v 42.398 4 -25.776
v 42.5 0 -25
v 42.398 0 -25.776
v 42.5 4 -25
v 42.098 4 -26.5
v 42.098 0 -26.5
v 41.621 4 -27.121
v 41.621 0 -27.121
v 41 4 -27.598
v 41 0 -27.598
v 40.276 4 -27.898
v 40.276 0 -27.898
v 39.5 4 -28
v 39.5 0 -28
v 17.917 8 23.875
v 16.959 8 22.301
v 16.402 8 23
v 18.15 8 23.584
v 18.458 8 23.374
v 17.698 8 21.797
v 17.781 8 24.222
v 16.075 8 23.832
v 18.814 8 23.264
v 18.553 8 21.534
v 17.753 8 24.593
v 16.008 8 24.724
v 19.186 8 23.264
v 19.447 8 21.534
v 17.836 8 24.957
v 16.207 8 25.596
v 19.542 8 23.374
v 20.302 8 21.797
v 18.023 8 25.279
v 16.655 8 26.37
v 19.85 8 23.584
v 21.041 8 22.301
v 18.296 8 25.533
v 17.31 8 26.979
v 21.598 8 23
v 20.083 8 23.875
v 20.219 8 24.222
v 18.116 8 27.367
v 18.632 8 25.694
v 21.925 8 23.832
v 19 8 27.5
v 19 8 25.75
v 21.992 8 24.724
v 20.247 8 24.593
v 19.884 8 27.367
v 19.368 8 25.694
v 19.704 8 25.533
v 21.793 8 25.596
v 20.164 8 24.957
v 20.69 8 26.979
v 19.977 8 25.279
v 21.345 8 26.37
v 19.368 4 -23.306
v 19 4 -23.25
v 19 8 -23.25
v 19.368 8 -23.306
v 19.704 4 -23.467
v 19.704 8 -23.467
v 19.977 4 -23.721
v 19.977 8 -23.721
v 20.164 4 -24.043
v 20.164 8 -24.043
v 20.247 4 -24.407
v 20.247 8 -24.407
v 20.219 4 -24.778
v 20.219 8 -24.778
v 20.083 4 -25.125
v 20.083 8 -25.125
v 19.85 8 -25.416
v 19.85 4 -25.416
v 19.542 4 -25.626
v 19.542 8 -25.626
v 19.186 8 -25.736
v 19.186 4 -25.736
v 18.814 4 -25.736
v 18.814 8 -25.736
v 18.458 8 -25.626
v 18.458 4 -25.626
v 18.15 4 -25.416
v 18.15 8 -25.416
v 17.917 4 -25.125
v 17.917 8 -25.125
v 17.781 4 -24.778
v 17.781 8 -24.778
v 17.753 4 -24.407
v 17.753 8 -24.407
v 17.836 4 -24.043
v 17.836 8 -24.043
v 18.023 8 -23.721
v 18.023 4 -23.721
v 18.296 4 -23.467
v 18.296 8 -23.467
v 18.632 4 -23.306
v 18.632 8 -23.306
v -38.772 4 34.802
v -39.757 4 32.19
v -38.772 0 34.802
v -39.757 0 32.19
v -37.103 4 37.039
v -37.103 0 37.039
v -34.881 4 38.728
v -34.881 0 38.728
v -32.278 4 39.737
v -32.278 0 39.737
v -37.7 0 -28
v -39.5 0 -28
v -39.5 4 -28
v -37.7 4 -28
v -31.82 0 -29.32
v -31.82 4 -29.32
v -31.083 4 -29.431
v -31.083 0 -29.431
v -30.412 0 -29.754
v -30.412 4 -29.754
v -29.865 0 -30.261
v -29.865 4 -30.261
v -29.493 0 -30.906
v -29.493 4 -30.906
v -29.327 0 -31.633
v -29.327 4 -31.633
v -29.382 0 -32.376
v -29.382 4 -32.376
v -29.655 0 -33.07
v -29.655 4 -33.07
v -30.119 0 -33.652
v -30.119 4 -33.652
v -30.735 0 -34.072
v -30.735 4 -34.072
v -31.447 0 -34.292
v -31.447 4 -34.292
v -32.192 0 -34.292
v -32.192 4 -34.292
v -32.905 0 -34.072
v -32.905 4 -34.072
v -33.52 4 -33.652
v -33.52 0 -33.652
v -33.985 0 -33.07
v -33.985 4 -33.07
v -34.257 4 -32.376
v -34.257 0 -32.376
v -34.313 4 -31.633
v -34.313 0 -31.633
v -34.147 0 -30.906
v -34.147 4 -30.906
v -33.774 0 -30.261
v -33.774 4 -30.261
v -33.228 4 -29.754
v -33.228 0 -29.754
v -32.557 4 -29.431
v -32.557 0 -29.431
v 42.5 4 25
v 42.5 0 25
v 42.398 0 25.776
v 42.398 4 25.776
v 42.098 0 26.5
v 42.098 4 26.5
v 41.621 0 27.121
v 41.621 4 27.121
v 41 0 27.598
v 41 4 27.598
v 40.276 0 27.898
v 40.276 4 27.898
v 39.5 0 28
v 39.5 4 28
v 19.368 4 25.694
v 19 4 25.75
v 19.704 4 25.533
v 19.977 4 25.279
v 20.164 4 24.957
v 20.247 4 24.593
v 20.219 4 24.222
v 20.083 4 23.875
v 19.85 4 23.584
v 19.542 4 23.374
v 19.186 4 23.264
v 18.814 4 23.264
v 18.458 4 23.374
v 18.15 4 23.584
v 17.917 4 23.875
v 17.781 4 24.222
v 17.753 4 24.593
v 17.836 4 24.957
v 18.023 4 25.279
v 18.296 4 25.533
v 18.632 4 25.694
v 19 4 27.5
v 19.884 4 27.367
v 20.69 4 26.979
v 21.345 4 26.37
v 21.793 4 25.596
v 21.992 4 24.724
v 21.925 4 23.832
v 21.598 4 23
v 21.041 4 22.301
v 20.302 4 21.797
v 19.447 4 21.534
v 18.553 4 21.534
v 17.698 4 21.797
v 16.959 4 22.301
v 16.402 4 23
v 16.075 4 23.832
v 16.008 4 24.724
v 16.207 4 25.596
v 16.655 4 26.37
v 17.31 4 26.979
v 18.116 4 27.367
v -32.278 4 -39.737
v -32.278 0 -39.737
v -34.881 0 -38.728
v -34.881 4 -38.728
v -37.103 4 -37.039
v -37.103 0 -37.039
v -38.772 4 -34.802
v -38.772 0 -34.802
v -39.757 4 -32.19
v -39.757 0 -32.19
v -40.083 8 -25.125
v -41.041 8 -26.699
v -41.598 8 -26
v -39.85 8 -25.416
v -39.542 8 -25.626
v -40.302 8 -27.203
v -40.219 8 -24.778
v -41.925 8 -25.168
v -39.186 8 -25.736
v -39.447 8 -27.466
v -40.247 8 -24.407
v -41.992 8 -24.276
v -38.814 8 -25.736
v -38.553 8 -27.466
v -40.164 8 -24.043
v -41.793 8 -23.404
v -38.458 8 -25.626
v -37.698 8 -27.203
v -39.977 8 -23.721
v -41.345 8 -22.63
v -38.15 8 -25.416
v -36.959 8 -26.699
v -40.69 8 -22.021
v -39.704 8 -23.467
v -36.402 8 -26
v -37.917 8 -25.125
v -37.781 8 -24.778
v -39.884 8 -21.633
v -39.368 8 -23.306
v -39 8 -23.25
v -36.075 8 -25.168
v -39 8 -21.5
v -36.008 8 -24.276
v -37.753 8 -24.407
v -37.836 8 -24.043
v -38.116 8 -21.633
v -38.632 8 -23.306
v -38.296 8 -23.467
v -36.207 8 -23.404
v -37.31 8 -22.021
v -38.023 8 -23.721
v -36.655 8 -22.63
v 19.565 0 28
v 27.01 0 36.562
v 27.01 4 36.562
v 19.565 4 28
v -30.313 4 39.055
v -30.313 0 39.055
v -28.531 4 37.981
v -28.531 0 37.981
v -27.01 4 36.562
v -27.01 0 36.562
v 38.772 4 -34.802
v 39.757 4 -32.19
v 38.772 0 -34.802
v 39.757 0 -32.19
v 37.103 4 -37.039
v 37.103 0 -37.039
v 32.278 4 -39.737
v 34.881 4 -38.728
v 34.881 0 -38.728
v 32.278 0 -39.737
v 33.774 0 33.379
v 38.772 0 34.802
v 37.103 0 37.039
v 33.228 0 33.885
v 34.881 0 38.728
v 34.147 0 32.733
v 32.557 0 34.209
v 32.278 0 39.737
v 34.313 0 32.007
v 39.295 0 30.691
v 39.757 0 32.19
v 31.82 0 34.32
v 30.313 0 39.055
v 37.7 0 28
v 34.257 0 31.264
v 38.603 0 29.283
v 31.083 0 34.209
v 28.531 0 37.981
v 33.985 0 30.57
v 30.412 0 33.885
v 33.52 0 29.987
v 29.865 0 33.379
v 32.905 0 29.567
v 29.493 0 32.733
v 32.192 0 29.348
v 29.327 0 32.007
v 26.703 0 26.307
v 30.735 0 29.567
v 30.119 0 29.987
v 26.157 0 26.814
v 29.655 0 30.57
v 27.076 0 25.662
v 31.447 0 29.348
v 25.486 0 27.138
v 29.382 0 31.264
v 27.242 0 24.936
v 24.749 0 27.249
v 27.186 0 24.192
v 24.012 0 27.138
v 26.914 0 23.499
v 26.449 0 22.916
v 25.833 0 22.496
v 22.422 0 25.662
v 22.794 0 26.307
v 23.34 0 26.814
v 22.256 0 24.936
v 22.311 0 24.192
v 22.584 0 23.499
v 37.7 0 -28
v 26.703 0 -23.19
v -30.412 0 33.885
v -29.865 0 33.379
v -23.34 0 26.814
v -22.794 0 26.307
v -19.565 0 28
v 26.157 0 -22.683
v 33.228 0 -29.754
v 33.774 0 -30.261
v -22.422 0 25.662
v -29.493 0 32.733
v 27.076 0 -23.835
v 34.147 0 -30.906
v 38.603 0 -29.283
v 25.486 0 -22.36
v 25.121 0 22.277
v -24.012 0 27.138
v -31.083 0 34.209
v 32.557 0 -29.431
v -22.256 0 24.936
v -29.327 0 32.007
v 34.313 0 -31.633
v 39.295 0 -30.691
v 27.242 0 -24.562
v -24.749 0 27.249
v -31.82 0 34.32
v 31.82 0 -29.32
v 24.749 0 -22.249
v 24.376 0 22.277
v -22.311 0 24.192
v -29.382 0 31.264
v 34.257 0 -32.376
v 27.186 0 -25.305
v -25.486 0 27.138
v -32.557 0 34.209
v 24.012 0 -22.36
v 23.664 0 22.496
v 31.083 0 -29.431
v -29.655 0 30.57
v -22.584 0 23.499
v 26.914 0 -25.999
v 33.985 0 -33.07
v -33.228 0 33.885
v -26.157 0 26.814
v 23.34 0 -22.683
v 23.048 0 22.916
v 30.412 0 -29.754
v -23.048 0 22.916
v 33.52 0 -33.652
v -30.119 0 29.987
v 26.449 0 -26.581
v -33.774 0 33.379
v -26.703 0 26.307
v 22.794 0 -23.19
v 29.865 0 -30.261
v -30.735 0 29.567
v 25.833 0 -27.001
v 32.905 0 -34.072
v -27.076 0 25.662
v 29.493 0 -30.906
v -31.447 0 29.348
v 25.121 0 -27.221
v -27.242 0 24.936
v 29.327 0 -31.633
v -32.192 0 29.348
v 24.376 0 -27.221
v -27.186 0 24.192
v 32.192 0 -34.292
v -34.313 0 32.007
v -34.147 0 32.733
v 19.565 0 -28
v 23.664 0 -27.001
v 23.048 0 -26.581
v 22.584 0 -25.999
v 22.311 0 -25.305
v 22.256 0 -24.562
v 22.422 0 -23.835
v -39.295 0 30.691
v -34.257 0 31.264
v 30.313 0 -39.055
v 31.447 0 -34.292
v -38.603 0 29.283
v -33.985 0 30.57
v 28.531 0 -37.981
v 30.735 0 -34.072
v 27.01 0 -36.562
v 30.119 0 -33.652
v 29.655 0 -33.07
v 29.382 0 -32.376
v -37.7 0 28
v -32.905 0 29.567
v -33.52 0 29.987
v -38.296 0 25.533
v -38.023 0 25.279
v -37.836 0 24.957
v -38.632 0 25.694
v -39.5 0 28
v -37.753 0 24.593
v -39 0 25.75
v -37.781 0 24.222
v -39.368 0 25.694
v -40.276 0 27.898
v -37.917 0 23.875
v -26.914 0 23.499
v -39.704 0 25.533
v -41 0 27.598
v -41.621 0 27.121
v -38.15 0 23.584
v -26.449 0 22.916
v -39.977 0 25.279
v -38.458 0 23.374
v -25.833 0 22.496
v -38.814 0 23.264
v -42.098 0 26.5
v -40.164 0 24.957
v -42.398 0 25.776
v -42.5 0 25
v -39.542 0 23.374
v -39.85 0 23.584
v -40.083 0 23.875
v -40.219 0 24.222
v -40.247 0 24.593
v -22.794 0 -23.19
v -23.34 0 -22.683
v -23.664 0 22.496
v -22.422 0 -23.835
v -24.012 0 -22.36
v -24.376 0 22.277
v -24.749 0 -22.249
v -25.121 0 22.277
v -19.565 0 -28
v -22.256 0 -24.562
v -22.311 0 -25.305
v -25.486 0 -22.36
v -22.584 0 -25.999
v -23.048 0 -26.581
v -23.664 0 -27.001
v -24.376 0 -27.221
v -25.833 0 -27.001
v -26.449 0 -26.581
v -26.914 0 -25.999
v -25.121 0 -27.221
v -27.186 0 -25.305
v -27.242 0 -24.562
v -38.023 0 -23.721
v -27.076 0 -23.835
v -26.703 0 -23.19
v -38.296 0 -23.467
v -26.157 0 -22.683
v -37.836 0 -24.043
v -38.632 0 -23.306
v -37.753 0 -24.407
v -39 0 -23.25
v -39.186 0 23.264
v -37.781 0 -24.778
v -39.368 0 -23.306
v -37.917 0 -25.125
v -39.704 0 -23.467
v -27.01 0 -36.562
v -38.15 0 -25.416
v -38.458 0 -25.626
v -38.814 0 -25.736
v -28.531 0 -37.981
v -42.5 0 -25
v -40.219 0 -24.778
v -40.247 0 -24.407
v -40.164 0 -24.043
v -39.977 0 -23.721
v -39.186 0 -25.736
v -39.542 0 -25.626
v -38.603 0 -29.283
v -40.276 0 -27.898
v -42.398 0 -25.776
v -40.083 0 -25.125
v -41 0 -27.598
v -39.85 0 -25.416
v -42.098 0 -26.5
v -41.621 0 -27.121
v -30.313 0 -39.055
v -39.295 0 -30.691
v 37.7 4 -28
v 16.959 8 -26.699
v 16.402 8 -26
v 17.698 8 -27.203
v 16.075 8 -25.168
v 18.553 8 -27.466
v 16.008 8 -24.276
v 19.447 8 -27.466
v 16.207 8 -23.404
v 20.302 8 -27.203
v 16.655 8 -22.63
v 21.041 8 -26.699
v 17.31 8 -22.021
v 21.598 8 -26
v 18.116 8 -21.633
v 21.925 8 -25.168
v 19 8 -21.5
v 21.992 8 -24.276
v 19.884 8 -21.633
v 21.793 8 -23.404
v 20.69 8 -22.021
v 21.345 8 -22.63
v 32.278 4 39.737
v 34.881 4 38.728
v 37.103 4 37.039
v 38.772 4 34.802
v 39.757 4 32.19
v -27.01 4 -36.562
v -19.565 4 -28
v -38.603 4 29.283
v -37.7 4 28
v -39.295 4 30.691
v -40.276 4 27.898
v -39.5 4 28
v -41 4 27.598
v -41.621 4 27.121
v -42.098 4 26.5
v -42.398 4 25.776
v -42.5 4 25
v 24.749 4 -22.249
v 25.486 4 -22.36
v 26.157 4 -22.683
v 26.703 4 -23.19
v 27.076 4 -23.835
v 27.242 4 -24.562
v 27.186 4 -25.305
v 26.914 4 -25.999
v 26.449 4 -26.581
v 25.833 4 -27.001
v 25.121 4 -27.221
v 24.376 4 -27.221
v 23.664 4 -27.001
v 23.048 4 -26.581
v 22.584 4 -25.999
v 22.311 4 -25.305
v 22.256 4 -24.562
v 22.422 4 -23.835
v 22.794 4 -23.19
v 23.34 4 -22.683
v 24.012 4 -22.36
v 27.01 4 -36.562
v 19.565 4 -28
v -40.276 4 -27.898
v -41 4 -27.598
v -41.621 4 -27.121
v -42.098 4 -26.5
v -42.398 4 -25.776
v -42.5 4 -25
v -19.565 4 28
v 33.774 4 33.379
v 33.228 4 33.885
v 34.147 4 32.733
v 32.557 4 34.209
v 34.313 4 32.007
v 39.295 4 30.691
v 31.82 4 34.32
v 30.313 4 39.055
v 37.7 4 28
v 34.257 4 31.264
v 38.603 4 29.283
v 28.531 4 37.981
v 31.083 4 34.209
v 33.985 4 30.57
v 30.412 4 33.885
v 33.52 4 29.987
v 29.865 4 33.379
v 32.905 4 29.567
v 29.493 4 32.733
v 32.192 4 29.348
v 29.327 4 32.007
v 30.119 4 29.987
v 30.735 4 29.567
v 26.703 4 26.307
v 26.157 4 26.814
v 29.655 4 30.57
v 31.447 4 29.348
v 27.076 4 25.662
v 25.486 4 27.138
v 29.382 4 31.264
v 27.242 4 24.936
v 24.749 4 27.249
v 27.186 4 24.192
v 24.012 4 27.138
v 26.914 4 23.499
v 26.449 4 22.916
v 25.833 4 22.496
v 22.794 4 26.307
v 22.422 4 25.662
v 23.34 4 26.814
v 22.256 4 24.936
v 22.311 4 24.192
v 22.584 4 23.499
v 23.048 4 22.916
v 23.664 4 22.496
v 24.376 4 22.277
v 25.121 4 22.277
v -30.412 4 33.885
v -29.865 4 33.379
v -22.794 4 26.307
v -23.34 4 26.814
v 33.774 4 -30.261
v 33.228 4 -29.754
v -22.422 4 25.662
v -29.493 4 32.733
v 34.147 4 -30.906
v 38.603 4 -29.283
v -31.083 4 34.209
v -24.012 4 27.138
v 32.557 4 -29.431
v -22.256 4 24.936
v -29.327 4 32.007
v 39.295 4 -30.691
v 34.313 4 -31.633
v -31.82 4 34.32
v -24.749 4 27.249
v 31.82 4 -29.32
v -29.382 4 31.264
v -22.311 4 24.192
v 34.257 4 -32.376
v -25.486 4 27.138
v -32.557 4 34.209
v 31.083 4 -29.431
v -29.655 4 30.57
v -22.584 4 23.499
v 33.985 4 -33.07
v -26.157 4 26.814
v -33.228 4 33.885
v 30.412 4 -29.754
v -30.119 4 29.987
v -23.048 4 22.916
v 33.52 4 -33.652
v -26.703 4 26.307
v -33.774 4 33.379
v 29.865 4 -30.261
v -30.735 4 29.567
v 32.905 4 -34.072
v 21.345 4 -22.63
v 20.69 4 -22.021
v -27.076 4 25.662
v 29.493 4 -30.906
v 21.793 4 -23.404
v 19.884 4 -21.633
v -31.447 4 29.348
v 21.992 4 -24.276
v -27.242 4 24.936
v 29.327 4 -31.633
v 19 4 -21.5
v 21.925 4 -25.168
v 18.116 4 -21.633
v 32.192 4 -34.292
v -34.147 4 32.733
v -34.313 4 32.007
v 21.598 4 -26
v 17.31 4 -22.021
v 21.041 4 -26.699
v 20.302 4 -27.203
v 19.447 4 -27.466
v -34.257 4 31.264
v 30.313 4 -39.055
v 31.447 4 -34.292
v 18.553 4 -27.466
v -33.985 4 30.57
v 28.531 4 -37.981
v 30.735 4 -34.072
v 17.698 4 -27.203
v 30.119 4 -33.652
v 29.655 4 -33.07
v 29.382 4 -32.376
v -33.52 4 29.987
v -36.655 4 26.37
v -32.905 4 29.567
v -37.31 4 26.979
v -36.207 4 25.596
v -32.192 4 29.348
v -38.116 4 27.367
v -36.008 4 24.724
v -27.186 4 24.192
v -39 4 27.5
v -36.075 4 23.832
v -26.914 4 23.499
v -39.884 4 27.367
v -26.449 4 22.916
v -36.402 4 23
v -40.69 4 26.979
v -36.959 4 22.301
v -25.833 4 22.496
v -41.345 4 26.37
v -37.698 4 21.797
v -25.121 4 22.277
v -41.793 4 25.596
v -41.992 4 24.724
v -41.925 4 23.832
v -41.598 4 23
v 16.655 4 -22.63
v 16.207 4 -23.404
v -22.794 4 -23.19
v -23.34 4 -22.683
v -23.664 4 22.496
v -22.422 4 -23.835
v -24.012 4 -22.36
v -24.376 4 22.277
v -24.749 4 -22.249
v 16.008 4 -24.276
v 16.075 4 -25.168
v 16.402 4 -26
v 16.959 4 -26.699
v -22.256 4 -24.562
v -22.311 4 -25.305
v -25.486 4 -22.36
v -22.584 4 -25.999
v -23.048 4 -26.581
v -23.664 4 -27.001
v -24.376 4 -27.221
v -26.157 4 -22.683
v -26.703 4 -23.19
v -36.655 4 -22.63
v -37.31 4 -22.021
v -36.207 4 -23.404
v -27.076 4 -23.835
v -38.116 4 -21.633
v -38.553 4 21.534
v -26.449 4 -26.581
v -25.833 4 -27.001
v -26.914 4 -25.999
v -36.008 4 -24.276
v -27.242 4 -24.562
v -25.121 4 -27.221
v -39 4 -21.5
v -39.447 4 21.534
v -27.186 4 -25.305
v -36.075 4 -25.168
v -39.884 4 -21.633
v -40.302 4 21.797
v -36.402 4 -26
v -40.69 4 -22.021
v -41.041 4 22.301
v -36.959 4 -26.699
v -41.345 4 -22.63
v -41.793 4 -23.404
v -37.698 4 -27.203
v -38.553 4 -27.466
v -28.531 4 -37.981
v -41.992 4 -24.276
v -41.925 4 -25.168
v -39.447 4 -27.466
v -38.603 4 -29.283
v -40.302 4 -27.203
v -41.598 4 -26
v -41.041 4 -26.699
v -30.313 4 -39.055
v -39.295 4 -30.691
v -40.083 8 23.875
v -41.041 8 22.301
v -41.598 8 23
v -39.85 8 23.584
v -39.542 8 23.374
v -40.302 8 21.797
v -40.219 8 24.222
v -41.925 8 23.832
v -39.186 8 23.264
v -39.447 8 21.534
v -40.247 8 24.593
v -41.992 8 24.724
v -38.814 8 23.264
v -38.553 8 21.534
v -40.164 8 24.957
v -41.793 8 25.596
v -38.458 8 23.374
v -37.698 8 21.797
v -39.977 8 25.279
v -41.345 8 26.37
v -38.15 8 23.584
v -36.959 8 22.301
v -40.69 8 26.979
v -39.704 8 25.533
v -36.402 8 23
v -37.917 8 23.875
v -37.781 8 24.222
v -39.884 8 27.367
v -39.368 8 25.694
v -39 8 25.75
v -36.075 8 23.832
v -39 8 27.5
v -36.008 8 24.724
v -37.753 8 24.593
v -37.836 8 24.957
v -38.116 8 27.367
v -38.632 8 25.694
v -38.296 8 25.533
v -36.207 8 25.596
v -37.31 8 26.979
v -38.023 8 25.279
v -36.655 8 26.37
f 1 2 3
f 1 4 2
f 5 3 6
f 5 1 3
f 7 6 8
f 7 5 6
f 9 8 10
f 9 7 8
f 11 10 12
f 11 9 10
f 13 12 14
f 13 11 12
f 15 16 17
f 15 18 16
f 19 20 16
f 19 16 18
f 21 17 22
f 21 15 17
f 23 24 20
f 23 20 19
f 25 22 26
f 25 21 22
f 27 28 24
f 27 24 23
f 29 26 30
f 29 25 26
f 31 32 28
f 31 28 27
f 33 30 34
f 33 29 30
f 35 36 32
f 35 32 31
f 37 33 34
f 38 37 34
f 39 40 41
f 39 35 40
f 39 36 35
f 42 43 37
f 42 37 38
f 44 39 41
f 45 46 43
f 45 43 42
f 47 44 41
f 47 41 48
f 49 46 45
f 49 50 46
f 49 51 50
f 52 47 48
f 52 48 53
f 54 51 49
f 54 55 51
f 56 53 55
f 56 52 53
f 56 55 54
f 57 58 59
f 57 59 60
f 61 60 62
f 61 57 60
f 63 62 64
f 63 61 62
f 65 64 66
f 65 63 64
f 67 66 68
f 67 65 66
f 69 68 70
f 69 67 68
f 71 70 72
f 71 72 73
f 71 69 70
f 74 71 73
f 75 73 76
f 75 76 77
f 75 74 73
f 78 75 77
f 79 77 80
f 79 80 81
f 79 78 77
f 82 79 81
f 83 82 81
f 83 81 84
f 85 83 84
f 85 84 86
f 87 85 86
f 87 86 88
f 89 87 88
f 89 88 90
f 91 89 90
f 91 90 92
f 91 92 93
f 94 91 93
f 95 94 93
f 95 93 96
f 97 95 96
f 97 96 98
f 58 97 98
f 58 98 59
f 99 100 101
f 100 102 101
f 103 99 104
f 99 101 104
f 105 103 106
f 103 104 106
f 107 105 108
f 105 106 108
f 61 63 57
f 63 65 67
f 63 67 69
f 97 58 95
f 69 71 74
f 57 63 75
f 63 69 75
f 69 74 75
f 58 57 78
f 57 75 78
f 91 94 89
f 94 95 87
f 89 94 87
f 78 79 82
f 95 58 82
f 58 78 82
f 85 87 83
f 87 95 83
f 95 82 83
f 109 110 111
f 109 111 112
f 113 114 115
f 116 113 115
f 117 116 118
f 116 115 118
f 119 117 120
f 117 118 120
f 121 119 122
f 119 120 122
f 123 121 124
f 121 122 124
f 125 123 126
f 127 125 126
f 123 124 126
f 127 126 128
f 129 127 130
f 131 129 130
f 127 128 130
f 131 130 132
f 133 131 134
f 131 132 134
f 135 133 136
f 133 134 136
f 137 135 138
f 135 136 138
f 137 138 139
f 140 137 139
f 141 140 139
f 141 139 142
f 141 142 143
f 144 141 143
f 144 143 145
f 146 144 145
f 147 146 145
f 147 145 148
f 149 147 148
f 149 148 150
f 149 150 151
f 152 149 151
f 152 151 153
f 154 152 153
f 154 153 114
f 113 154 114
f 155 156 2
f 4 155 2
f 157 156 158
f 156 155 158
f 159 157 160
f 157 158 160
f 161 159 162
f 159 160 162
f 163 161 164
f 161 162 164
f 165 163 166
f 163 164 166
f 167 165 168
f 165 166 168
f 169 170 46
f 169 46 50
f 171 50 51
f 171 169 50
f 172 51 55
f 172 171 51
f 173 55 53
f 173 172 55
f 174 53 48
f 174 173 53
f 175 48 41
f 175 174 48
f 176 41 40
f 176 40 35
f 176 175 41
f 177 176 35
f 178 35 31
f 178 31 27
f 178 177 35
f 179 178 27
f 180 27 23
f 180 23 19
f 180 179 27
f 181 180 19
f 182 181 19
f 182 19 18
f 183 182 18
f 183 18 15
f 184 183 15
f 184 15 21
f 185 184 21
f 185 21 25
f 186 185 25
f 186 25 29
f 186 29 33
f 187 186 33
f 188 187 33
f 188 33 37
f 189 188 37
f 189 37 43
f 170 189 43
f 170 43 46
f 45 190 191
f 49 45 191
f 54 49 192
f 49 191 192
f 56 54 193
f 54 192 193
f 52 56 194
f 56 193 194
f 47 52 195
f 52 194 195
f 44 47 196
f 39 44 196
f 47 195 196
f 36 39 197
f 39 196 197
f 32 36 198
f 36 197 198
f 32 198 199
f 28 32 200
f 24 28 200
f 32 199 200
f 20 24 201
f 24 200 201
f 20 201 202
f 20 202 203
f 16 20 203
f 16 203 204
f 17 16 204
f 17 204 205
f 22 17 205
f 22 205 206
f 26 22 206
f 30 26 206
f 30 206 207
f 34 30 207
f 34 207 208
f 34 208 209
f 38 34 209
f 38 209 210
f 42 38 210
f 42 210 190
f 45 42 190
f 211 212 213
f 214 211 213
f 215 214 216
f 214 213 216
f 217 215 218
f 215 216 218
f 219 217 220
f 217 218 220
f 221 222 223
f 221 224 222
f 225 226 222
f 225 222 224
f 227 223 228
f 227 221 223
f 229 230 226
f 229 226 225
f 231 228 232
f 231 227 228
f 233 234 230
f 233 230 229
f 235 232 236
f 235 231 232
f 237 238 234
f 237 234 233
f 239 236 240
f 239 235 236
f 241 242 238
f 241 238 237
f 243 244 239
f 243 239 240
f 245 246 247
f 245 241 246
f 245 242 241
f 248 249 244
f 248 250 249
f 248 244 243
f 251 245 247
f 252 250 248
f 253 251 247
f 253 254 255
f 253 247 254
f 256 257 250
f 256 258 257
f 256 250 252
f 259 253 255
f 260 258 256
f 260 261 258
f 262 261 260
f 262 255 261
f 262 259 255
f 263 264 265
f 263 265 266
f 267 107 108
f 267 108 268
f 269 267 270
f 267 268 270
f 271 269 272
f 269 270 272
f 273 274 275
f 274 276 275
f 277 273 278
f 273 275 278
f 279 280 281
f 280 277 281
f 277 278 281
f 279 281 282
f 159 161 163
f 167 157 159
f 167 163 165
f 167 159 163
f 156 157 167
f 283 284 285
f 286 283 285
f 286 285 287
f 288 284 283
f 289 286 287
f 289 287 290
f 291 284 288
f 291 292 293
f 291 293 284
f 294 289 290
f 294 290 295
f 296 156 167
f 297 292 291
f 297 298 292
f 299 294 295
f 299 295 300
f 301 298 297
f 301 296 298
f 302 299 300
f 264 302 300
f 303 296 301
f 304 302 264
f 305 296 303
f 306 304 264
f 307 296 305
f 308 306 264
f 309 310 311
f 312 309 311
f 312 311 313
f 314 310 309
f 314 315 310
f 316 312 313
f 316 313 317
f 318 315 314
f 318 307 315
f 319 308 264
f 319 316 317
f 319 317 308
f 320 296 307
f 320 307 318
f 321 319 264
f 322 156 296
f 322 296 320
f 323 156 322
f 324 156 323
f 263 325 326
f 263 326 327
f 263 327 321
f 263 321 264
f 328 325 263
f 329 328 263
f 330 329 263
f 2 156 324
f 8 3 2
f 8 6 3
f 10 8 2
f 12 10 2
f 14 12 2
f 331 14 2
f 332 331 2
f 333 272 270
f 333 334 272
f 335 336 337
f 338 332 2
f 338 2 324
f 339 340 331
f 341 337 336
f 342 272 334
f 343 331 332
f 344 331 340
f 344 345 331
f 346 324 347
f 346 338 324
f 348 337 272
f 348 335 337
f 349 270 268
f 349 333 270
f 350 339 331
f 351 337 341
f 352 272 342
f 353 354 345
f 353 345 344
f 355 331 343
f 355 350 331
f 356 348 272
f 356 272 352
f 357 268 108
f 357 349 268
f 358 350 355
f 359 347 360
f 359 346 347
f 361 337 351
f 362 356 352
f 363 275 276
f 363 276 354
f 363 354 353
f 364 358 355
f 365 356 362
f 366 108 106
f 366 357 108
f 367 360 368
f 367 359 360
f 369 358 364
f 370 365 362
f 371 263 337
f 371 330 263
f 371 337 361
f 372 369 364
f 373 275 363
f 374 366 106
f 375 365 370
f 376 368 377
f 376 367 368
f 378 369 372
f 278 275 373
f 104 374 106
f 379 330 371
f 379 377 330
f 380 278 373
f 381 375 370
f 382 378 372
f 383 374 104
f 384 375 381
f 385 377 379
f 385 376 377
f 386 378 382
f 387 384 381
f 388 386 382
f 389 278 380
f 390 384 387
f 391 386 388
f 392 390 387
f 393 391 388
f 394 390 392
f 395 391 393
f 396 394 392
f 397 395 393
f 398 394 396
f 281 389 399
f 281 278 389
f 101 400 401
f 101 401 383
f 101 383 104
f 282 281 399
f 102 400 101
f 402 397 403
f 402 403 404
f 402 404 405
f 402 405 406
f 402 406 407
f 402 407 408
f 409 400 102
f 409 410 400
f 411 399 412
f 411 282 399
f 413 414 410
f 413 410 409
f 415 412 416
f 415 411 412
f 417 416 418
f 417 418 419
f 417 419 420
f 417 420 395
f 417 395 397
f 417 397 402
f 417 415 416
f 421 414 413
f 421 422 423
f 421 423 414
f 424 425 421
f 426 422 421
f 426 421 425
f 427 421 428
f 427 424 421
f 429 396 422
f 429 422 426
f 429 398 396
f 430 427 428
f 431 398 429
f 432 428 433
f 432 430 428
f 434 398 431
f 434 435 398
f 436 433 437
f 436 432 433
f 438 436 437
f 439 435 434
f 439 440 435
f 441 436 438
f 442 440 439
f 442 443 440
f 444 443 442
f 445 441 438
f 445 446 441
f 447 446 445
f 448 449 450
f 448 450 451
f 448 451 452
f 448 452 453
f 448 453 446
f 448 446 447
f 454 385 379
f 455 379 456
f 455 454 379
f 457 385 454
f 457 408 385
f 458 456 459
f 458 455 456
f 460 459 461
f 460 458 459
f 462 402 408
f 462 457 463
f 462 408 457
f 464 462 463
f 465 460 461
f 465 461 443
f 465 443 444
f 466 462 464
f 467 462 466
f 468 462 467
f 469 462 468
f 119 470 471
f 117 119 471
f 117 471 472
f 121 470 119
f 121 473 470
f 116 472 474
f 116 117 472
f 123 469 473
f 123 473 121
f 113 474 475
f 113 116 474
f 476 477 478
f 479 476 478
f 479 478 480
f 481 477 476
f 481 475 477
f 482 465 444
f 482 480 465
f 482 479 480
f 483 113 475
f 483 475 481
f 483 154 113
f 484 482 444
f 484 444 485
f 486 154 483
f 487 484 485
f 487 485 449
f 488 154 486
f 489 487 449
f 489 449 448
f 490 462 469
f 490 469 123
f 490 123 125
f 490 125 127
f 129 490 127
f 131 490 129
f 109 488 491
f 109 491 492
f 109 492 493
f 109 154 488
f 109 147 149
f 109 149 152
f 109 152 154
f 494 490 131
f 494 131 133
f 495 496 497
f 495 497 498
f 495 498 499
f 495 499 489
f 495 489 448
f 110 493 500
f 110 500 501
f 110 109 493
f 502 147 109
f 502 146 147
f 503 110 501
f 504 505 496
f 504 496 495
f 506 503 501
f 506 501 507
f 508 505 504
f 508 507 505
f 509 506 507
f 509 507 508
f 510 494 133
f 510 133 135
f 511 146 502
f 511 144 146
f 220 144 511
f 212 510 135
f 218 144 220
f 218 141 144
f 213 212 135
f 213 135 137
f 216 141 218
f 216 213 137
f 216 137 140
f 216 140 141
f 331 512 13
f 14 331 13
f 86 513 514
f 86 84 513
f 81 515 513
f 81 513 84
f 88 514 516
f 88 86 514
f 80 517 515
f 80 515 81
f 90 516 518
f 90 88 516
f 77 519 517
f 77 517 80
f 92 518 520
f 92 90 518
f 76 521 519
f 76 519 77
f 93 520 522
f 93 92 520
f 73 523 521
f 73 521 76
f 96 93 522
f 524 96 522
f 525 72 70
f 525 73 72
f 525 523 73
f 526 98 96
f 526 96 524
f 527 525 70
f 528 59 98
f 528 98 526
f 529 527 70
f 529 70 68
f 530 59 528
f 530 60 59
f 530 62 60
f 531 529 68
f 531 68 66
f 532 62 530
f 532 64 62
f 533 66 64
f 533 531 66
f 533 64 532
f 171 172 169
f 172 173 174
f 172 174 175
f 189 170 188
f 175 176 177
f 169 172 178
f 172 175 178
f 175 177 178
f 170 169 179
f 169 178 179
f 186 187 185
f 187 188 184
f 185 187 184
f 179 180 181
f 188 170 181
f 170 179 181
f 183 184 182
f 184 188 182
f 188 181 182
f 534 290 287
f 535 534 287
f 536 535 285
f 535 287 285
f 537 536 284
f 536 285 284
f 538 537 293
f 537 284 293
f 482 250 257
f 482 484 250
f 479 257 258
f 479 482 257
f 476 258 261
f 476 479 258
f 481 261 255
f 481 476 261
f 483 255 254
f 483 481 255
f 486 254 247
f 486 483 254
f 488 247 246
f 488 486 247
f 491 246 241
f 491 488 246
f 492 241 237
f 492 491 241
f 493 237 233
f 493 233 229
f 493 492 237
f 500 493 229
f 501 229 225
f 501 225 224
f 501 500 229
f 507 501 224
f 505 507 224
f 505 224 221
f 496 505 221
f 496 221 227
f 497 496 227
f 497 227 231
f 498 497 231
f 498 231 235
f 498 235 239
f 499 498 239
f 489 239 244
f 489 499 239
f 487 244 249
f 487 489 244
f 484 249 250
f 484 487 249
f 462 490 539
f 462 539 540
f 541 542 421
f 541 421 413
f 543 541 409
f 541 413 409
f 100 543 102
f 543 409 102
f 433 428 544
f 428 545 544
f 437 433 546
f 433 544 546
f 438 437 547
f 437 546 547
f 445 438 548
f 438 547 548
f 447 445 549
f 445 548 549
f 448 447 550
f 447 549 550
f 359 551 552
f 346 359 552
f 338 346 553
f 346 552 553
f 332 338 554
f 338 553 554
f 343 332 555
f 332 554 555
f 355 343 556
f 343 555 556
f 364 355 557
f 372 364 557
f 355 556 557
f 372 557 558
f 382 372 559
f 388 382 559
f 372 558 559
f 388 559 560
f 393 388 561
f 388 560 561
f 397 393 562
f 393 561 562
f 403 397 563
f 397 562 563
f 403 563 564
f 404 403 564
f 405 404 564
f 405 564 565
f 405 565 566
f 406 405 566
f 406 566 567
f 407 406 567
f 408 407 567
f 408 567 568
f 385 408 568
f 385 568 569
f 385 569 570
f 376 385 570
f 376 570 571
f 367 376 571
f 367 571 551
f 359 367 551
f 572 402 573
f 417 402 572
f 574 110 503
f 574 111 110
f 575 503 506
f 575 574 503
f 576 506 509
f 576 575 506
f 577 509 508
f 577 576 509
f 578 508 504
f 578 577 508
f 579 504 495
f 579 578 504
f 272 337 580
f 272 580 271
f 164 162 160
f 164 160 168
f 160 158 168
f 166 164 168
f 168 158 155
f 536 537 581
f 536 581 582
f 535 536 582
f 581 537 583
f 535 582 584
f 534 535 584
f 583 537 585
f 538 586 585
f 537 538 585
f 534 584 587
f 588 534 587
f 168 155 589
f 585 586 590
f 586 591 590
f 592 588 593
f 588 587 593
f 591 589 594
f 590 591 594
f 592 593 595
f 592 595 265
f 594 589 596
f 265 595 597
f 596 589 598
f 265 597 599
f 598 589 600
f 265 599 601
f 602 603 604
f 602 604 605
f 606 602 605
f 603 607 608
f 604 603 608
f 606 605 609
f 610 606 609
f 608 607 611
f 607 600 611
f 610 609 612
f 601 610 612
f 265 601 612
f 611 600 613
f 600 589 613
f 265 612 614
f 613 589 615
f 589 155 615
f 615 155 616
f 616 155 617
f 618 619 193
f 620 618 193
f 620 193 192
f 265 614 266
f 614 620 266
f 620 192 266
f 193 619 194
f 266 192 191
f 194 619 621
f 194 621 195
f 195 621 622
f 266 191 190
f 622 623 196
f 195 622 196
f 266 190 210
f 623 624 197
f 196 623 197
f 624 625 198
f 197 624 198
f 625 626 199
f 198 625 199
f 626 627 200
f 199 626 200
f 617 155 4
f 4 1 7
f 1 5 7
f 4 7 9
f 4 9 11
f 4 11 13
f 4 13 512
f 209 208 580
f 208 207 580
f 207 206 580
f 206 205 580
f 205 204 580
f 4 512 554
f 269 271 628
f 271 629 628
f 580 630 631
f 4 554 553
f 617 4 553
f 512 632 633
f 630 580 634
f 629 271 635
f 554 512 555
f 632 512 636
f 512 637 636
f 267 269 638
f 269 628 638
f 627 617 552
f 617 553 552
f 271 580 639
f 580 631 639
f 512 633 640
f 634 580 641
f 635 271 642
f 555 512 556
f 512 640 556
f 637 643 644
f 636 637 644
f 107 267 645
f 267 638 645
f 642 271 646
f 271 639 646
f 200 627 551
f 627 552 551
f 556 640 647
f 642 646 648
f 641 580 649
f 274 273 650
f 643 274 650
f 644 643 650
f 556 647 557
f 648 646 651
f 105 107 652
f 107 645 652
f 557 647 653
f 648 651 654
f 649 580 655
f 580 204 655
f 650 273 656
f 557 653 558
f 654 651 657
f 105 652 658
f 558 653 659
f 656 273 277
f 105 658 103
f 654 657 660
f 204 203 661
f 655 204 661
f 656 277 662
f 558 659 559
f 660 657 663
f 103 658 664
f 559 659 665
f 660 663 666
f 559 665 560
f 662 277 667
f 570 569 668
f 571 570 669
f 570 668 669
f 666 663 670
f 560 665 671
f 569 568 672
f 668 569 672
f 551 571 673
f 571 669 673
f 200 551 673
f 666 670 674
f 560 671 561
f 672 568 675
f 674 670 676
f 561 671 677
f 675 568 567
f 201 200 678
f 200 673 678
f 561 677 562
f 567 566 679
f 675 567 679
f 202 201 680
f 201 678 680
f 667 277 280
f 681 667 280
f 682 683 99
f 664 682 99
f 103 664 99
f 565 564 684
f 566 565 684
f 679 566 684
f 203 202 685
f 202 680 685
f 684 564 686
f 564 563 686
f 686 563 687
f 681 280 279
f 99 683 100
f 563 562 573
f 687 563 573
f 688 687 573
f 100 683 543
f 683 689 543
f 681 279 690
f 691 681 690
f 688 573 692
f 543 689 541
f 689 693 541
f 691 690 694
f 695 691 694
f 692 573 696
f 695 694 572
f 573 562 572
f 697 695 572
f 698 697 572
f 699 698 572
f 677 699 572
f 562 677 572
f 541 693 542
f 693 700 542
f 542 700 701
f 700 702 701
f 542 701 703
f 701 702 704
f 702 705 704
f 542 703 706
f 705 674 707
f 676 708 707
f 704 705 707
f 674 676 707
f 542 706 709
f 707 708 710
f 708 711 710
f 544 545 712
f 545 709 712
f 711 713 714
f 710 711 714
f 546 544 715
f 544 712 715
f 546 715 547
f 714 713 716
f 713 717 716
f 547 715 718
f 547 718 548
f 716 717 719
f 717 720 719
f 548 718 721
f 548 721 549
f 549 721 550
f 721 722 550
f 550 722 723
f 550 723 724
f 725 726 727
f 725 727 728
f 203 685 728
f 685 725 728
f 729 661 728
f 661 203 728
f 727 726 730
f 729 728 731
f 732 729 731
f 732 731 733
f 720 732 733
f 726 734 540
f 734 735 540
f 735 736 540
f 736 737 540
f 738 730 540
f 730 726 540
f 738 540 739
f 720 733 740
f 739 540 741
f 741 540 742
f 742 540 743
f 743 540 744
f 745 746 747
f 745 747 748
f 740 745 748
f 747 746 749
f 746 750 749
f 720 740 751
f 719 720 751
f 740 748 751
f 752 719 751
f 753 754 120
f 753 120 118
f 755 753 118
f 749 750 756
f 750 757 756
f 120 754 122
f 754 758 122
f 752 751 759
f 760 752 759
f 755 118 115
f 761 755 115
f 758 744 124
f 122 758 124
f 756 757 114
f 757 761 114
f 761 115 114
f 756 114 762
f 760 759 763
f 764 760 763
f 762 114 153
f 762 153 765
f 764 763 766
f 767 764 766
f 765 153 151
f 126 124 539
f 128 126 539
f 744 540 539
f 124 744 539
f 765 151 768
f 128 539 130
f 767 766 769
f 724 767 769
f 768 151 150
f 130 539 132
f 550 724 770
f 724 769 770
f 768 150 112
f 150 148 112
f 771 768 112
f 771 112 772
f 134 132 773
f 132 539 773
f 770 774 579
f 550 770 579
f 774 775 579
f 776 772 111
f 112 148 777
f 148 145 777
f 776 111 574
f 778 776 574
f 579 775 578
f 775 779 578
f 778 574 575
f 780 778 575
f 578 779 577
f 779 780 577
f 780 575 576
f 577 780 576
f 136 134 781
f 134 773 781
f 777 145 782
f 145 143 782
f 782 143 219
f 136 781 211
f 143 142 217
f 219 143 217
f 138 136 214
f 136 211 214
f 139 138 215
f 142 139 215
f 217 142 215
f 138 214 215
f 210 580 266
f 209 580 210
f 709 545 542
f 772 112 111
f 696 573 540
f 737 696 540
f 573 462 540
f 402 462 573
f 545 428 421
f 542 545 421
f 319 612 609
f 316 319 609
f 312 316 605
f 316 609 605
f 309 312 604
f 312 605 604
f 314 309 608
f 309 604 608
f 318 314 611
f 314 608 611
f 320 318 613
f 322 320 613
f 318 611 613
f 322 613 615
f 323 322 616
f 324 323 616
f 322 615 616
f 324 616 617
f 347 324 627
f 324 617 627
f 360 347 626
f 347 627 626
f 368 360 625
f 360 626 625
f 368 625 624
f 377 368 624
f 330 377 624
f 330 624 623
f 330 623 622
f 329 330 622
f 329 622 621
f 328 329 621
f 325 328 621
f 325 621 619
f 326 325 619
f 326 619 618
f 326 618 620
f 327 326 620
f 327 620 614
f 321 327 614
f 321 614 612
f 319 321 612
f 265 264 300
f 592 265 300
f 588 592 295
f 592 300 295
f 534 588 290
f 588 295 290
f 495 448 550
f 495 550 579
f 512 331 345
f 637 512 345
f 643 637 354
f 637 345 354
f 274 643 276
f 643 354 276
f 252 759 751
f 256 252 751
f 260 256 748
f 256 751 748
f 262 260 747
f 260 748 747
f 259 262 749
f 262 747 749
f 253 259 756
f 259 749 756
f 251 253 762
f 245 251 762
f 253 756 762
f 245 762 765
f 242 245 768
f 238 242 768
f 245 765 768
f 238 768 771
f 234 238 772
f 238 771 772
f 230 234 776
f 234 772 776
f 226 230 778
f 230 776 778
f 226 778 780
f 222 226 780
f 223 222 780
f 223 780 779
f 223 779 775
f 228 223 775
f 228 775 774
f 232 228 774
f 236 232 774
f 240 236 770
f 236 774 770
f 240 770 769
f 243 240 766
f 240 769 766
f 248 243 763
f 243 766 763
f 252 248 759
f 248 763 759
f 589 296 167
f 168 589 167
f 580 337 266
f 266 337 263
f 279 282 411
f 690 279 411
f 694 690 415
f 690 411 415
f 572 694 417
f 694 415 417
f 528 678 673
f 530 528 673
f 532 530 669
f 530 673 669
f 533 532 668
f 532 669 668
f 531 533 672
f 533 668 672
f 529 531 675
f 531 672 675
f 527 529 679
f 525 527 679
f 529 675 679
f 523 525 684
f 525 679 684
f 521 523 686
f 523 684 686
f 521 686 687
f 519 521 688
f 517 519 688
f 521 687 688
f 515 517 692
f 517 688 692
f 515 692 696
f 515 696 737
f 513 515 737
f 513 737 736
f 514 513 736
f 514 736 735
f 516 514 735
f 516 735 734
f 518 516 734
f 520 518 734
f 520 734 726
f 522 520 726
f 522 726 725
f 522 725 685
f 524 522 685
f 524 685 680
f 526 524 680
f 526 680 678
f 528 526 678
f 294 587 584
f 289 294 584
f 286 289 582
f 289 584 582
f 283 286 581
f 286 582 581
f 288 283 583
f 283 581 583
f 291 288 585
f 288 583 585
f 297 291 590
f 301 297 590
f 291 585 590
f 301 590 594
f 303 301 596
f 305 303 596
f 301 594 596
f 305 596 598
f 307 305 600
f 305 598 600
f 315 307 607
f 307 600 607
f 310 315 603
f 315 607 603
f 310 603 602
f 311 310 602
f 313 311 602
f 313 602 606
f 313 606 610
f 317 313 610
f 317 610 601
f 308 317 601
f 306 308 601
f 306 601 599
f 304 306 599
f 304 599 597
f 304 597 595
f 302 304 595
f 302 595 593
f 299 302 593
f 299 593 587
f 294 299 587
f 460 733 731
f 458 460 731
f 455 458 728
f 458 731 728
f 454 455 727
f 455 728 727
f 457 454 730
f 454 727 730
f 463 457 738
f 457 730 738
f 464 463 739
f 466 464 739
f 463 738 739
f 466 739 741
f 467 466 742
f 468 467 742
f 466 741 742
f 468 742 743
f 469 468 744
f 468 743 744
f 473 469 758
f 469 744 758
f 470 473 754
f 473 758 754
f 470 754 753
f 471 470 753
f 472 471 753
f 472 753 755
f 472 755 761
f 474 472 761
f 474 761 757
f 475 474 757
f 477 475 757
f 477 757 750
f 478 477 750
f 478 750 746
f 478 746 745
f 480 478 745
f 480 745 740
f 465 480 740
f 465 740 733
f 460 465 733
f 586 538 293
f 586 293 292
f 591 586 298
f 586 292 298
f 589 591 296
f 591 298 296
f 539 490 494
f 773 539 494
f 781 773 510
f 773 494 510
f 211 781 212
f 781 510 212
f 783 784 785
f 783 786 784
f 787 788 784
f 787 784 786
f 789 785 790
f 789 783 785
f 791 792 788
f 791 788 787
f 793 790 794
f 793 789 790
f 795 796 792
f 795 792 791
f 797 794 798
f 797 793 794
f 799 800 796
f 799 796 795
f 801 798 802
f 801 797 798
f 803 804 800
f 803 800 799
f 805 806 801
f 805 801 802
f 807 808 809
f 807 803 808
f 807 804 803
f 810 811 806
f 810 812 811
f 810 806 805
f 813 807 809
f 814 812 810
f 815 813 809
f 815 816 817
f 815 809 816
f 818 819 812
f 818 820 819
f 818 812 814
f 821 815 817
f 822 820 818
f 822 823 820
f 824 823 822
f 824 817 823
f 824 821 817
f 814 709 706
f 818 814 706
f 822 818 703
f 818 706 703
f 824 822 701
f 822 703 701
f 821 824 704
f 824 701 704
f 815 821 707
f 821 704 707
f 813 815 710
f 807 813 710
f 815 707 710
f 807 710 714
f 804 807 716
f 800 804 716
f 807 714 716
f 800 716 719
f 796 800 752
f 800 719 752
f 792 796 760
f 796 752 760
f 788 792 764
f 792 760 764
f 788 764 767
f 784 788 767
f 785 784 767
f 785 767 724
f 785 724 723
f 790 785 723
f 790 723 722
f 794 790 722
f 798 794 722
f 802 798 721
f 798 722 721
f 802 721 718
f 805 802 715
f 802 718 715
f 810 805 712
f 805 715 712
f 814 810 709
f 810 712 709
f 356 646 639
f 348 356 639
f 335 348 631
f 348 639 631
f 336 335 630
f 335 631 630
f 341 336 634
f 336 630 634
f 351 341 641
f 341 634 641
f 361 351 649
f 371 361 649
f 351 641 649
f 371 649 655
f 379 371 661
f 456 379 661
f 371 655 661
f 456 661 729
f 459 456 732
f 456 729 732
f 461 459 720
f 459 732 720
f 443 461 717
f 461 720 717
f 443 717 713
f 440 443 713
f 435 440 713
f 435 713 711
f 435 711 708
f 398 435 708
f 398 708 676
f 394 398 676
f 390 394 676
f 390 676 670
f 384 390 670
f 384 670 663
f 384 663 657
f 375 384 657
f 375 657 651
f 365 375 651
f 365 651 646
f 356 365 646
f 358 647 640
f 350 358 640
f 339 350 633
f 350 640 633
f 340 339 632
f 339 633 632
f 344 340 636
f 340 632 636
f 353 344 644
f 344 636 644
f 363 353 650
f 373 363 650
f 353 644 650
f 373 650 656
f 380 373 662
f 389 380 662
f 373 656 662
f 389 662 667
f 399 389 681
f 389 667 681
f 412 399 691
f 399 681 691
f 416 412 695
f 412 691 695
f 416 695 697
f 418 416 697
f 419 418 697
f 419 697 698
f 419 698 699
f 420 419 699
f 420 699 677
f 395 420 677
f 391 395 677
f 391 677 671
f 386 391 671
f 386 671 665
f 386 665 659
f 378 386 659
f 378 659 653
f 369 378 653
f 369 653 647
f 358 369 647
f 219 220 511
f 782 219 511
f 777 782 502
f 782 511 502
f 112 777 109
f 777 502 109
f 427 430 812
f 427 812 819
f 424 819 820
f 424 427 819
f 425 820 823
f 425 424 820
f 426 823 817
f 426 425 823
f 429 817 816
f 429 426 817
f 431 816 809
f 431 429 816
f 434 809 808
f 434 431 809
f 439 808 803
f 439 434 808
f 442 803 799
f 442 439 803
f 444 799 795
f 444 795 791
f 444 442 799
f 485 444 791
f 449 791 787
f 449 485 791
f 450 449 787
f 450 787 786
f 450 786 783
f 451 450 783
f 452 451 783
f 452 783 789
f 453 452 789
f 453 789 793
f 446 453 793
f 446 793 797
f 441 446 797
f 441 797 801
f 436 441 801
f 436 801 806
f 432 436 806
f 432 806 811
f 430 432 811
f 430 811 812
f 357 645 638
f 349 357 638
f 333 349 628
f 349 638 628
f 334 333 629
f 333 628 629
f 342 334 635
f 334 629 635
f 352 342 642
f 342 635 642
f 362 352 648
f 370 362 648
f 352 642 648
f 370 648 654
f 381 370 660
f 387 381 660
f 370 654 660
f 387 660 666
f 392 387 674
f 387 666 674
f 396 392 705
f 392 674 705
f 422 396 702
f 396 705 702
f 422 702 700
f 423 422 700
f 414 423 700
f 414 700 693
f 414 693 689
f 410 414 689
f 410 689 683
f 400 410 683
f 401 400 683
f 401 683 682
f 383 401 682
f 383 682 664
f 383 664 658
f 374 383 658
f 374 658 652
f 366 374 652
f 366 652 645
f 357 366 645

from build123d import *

# Parameters (mm, degrees)
SKETCH1_W           = 85
SKETCH1_H           = 56
SKETCH1_R           = 1.25
BOSS_EXTRUDE1_DEPTH = 4
SKETCH2_R           = 3
SKETCH2_R_2         = 1.25
BOSS_EXTRUDE2_DEPTH = 4
FILLET1_R           = 3
BOSS_EXTRUDE4_DEPTH = 4
SKETCH3_R           = 2.5
CUT_EXTRUDE1_DEPTH  = 59.5
FILLET2_R           = 10


with BuildPart() as part:
    # Sketch1 → Boss-Extrude1 (new body)
    with BuildSketch(Plane(origin=(0, 0, 0), x_dir=(1, 0, 0), z_dir=(0, 1, 0))):
        Rectangle(SKETCH1_W, SKETCH1_H)
        with Locations(Location((-39, 24.5, 0), (0, 0, 270))):
            Circle(SKETCH1_R, mode=Mode.SUBTRACT)
        with Locations(Location((-39, -24.5, 0), (0, 0, 270))):
            Circle(SKETCH1_R, mode=Mode.SUBTRACT)
        with Locations(Location((19, 24.5, 0), (0, 0, 270))):
            Circle(SKETCH1_R, mode=Mode.SUBTRACT)
        with Locations(Location((19, -24.5, 0), (0, 0, 270))):
            Circle(SKETCH1_R, mode=Mode.SUBTRACT)
    extrude(amount=BOSS_EXTRUDE1_DEPTH)

    # Sketch2 → Boss-Extrude2 (add)
    # profile 1 of 4: a face of its own
    with BuildSketch(Plane(origin=(0, 4, 0), x_dir=(1, 0, 0), z_dir=(0, 1, 0))):
        with Locations(Location((-39, 24.5, 0), (0, 0, 270))):
            Circle(SKETCH2_R)
        with Locations(Location((-39, 24.5, 0), (0, 0, 270))):
            Circle(SKETCH2_R_2, mode=Mode.SUBTRACT)
    # profile 2 of 4: a face of its own
    with BuildSketch(Plane(origin=(0, 4, 0), x_dir=(1, 0, 0), z_dir=(0, 1, 0))):
        with Locations(Location((19, 24.5, 0), (0, 0, 270))):
            Circle(SKETCH2_R)
        with Locations(Location((19, 24.5, 0), (0, 0, 270))):
            Circle(SKETCH2_R_2, mode=Mode.SUBTRACT)
    # profile 3 of 4: a face of its own
    with BuildSketch(Plane(origin=(0, 4, 0), x_dir=(1, 0, 0), z_dir=(0, 1, 0))):
        with Locations(Location((19, -24.5, 0), (0, 0, 270))):
            Circle(SKETCH2_R)
        with Locations(Location((19, -24.5, 0), (0, 0, 270))):
            Circle(SKETCH2_R_2, mode=Mode.SUBTRACT)
    # profile 4 of 4: a face of its own
    with BuildSketch(Plane(origin=(0, 4, 0), x_dir=(1, 0, 0), z_dir=(0, 1, 0))):
        with Locations(Location((-39, -24.5, 0), (0, 0, 270))):
            Circle(SKETCH2_R)
        with Locations(Location((-39, -24.5, 0), (0, 0, 270))):
            Circle(SKETCH2_R_2, mode=Mode.SUBTRACT)
    extrude(amount=BOSS_EXTRUDE2_DEPTH)

    # Fillet1
    fillet1_edges = [part.edges().sort_by_distance(p)[0] for p in [
        (-42.5, 2, 28),
        (-42.5, 2, -28),
        (42.5, 2, -28),
        (42.5, 2, 28),
    ]]
    fillet(fillet1_edges, radius=FILLET1_R)

    # Sketch5 → Boss-Extrude4 (add)
    with BuildSketch(Plane(origin=(0, 0, 0), x_dir=(1, 0, 0), z_dir=(0, 1, 0))):
        Polygon((-40, -30), (-17, -10), (-17, 10), (-40, 30), (-40, 40), (-30, 40), (-10, 17), (10, 17), (30, 40), (40, 40), (40, 30), (17, 10), (17, -10), (40, -30), (40, -40), (30, -40), (10, -17), (-10, -17), (-30, -40), (-40, -40), align=None)
    extrude(amount=BOSS_EXTRUDE4_DEPTH)

    # Sketch3 → Cut-Extrude1 (cut, through all)
    with BuildSketch(Plane(origin=(0, 4, 0), x_dir=(1, 0, 0), z_dir=(0, 1, 0))):
        with Locations(Location((-31.819805153, 31.819805153, 0), (0, 0, 270))):
            Circle(SKETCH3_R)
        with Locations(Location((-24.748737342, 24.748737342, 0), (0, 0, 270))):
            Circle(SKETCH3_R)
        with Locations(Location((31.819805153, 31.819805153, 0), (0, 0, 270))):
            Circle(SKETCH3_R)
        with Locations(Location((24.748737342, 24.748737342, 0), (0, 0, 270))):
            Circle(SKETCH3_R)
        with Locations(Location((24.748737342, -24.748737342, 0), (0, 0, 270))):
            Circle(SKETCH3_R)
        with Locations(Location((31.819805153, -31.819805153, 0), (0, 0, 270))):
            Circle(SKETCH3_R)
        with Locations(Location((-31.819805153, -31.819805153, 0), (0, 0, 270))):
            Circle(SKETCH3_R)
        with Locations(Location((-24.748737342, -24.748737342, 0), (0, 0, 270))):
            Circle(SKETCH3_R)
    extrude(amount=-CUT_EXTRUDE1_DEPTH, mode=Mode.SUBTRACT)

    # Fillet2
    # the kernel refuses this fillet: 10 mm, written as the material it takes off along each edge
    with BuildSketch(Plane(origin=(-40, -10.951097141, -30), x_dir=(0.7546055221635131, 0, 0.6561787149247771), z_dir=(0, 1, 0))) as fillet2_piece_1_section:
        with BuildLine():
            CenterArc((4.671704482, 9.8672905), FILLET2_R, 221.009086902, 39.646111147)
            Line((-2.87435074, 3.305503351), (-3.025271844, 3.174267608))
            Line((-3.025271844, 3.174267608), (-0.150921104, -0.131235743))
            Line((-0.150921104, -0.131235743), (0, -0.2))
            ThreePointArc((0, -0.2), (1.523975065, -0.2), (3.015475044, -0.19734581))
            Line((3.015475044, -0.19734581), (3.047950131, 0))
        make_face()
    fillet2_piece_1 = extrude(amount=25.902194282, mode=Mode.PRIVATE)
    fillet2_piece_1 = split(fillet2_piece_1, bisect_by=Plane(origin=(-39.506364614, 2, -28), z_dir=(0, 0, -1)), keep=Keep.TOP, mode=Mode.PRIVATE)
    add(fillet2_piece_1, mode=Mode.SUBTRACT)
    with BuildSketch(Plane(origin=(-40, -25, -40), x_dir=(0, 0, 1), z_dir=(0, 1, 0)), Plane(origin=(40, -25, -40), x_dir=(-1, 0, 0), z_dir=(0, 1, 0))) as fillet2_piece_2:
        with BuildLine():
            CenterArc((FILLET2_R, FILLET2_R), FILLET2_R, 180, 90)
            Line((0, FILLET2_R), (-FILLET2_R * 0.02, FILLET2_R))
            Line((-FILLET2_R * 0.02, FILLET2_R), (-FILLET2_R * 0.02, -FILLET2_R * 0.02))
            Line((-FILLET2_R * 0.02, -FILLET2_R * 0.02), (FILLET2_R, -FILLET2_R * 0.02))
            Line((FILLET2_R, -FILLET2_R * 0.02), (FILLET2_R, 0))
        make_face()
    extrude(amount=54, mode=Mode.SUBTRACT)
    with BuildSketch(Plane(origin=(-30, -11.390762292, -40), x_dir=(-1, 0, 0), z_dir=(0, 1, 0)), Plane(origin=(30, -11.390762292, -40), x_dir=(-0.6561787149247741, 0, 0.7546055221635154), z_dir=(0, 1, 0))) as fillet2_piece_3:
        with BuildLine():
            CenterArc((FILLET2_R * 0.455630491663, FILLET2_R), FILLET2_R, 221.009086902, 48.990913098)
            Line((-FILLET2_R * 0.2989750305, FILLET2_R * 0.343821285075), (-FILLET2_R * 0.314067140943, FILLET2_R * 0.330697710777))
            Line((-FILLET2_R * 0.314067140943, FILLET2_R * 0.330697710777), (-FILLET2_R * 0.00911260983327, -FILLET2_R * 0.02))
            Line((-FILLET2_R * 0.00911260983327, -FILLET2_R * 0.02), (FILLET2_R * 0.455630491663, -FILLET2_R * 0.02))
            Line((FILLET2_R * 0.455630491663, -FILLET2_R * 0.02), (FILLET2_R * 0.455630491663, 0))
        make_face()
    extrude(amount=26.781524583, mode=Mode.SUBTRACT)
    with BuildSketch(Plane(origin=(40, -10.951097141, -30), x_dir=(0, 0, -1), z_dir=(0, 1, 0))) as fillet2_piece_4_section:
        with BuildLine():
            CenterArc((4.380438856, 10), FILLET2_R, 230.353888853, 39.646111147)
            Line((-2, 2.3), (-2.127608777, 2.146))
            ThreePointArc((-2.127608777, 2.146), (-1.150921104, 1.018764257), (-0.150921104, -0.131235743))
            Line((-0.150921104, -0.131235743), (0, -0.2))
            Line((0, -0.2), (4.380438856, -0.2))
            Line((4.380438856, -0.2), (4.380438856, 0))
        make_face()
    fillet2_piece_4 = extrude(amount=25.902194282, mode=Mode.PRIVATE)
    fillet2_piece_4 = split(fillet2_piece_4, bisect_by=Plane(origin=(39.506364614, 2, -28), z_dir=(0, 0, -1)), keep=Keep.TOP, mode=Mode.PRIVATE)
    add(fillet2_piece_4, mode=Mode.SUBTRACT)
    with BuildSketch(Plane(origin=(40, -10.951097141, 30), x_dir=(0, 0, 1), z_dir=(0, 1, 0))) as fillet2_piece_5_section:
        with BuildLine():
            CenterArc((4.380438856, -10), FILLET2_R, 90, 39.646111147)
            Line((-2, -2.3), (-2.127608777, -2.146))
            ThreePointArc((-2.127608777, -2.146), (-1.150921104, -1.018764257), (-0.150921104, 0.131235743))
            Line((-0.150921104, 0.131235743), (0, 0.2))
            Line((0, 0.2), (4.380438856, 0.2))
            Line((4.380438856, 0.2), (4.380438856, 0))
        make_face()
    fillet2_piece_5 = extrude(amount=25.902194282, mode=Mode.PRIVATE)
    fillet2_piece_5 = split(fillet2_piece_5, bisect_by=Plane(origin=(39.506364614, 2, 28), z_dir=(0, 0, 1)), keep=Keep.TOP, mode=Mode.PRIVATE)
    add(fillet2_piece_5, mode=Mode.SUBTRACT)
    with BuildSketch(Plane(origin=(40, -25, 40), x_dir=(-1, 0, 0), z_dir=(0, 1, 0)), Plane(origin=(-40, -25, 40), x_dir=(0, 0, -1), z_dir=(0, 1, 0))) as fillet2_piece_6:
        with BuildLine():
            CenterArc((FILLET2_R, -FILLET2_R), FILLET2_R, 90, 90)
            Line((0, -FILLET2_R), (-FILLET2_R * 0.02, -FILLET2_R))
            Line((-FILLET2_R * 0.02, -FILLET2_R), (-FILLET2_R * 0.02, FILLET2_R * 0.02))
            Line((-FILLET2_R * 0.02, FILLET2_R * 0.02), (FILLET2_R, FILLET2_R * 0.02))
            Line((FILLET2_R, FILLET2_R * 0.02), (FILLET2_R, 0))
        make_face()
    extrude(amount=54, mode=Mode.SUBTRACT)
    with BuildSketch(Plane(origin=(30, -11.390762292, 40), x_dir=(-0.6561787149247873, 0, -0.7546055221635042), z_dir=(0, 1, 0)), Plane(origin=(-30, -11.390762292, 40), x_dir=(-1, 0, 0), z_dir=(0, 1, 0))) as fillet2_piece_7:
        with BuildLine():
            CenterArc((FILLET2_R * 0.455630491663, -FILLET2_R), FILLET2_R, 90, 48.990913098)
            Line((-FILLET2_R * 0.2989750305, -FILLET2_R * 0.343821285075), (-FILLET2_R * 0.314067140943, -FILLET2_R * 0.330697710777))
            Line((-FILLET2_R * 0.314067140943, -FILLET2_R * 0.330697710777), (-FILLET2_R * 0.00911260983327, FILLET2_R * 0.02))
            Line((-FILLET2_R * 0.00911260983327, FILLET2_R * 0.02), (FILLET2_R * 0.455630491663, FILLET2_R * 0.02))
            Line((FILLET2_R * 0.455630491663, FILLET2_R * 0.02), (FILLET2_R * 0.455630491663, 0))
        make_face()
    extrude(amount=26.781524583, mode=Mode.SUBTRACT)
    with BuildSketch(Plane(origin=(-40, -10.951097141, 30), x_dir=(0.7546055221635047, 0, -0.6561787149247865), z_dir=(0, 1, 0))) as fillet2_piece_8_section:
        with BuildLine():
            CenterArc((4.671704482, -9.8672905), FILLET2_R, 99.344801951, 39.646111147)
            Line((-2.87435074, -3.305503351), (-3.025271844, -3.174267608))
            Line((-3.025271844, -3.174267608), (-0.150921104, 0.131235743))
            Line((-0.150921104, 0.131235743), (0, 0.2))
            ThreePointArc((0, 0.2), (1.523975065, 0.2), (3.015475044, 0.19734581))
            Line((3.015475044, 0.19734581), (3.047950131, 0))
        make_face()
    fillet2_piece_8 = extrude(amount=25.902194282, mode=Mode.PRIVATE)
    fillet2_piece_8 = split(fillet2_piece_8, bisect_by=Plane(origin=(-39.506364614, 2, 28), z_dir=(0, 0, 1)), keep=Keep.TOP, mode=Mode.PRIVATE)
    add(fillet2_piece_8, mode=Mode.SUBTRACT)


solid = part.part
